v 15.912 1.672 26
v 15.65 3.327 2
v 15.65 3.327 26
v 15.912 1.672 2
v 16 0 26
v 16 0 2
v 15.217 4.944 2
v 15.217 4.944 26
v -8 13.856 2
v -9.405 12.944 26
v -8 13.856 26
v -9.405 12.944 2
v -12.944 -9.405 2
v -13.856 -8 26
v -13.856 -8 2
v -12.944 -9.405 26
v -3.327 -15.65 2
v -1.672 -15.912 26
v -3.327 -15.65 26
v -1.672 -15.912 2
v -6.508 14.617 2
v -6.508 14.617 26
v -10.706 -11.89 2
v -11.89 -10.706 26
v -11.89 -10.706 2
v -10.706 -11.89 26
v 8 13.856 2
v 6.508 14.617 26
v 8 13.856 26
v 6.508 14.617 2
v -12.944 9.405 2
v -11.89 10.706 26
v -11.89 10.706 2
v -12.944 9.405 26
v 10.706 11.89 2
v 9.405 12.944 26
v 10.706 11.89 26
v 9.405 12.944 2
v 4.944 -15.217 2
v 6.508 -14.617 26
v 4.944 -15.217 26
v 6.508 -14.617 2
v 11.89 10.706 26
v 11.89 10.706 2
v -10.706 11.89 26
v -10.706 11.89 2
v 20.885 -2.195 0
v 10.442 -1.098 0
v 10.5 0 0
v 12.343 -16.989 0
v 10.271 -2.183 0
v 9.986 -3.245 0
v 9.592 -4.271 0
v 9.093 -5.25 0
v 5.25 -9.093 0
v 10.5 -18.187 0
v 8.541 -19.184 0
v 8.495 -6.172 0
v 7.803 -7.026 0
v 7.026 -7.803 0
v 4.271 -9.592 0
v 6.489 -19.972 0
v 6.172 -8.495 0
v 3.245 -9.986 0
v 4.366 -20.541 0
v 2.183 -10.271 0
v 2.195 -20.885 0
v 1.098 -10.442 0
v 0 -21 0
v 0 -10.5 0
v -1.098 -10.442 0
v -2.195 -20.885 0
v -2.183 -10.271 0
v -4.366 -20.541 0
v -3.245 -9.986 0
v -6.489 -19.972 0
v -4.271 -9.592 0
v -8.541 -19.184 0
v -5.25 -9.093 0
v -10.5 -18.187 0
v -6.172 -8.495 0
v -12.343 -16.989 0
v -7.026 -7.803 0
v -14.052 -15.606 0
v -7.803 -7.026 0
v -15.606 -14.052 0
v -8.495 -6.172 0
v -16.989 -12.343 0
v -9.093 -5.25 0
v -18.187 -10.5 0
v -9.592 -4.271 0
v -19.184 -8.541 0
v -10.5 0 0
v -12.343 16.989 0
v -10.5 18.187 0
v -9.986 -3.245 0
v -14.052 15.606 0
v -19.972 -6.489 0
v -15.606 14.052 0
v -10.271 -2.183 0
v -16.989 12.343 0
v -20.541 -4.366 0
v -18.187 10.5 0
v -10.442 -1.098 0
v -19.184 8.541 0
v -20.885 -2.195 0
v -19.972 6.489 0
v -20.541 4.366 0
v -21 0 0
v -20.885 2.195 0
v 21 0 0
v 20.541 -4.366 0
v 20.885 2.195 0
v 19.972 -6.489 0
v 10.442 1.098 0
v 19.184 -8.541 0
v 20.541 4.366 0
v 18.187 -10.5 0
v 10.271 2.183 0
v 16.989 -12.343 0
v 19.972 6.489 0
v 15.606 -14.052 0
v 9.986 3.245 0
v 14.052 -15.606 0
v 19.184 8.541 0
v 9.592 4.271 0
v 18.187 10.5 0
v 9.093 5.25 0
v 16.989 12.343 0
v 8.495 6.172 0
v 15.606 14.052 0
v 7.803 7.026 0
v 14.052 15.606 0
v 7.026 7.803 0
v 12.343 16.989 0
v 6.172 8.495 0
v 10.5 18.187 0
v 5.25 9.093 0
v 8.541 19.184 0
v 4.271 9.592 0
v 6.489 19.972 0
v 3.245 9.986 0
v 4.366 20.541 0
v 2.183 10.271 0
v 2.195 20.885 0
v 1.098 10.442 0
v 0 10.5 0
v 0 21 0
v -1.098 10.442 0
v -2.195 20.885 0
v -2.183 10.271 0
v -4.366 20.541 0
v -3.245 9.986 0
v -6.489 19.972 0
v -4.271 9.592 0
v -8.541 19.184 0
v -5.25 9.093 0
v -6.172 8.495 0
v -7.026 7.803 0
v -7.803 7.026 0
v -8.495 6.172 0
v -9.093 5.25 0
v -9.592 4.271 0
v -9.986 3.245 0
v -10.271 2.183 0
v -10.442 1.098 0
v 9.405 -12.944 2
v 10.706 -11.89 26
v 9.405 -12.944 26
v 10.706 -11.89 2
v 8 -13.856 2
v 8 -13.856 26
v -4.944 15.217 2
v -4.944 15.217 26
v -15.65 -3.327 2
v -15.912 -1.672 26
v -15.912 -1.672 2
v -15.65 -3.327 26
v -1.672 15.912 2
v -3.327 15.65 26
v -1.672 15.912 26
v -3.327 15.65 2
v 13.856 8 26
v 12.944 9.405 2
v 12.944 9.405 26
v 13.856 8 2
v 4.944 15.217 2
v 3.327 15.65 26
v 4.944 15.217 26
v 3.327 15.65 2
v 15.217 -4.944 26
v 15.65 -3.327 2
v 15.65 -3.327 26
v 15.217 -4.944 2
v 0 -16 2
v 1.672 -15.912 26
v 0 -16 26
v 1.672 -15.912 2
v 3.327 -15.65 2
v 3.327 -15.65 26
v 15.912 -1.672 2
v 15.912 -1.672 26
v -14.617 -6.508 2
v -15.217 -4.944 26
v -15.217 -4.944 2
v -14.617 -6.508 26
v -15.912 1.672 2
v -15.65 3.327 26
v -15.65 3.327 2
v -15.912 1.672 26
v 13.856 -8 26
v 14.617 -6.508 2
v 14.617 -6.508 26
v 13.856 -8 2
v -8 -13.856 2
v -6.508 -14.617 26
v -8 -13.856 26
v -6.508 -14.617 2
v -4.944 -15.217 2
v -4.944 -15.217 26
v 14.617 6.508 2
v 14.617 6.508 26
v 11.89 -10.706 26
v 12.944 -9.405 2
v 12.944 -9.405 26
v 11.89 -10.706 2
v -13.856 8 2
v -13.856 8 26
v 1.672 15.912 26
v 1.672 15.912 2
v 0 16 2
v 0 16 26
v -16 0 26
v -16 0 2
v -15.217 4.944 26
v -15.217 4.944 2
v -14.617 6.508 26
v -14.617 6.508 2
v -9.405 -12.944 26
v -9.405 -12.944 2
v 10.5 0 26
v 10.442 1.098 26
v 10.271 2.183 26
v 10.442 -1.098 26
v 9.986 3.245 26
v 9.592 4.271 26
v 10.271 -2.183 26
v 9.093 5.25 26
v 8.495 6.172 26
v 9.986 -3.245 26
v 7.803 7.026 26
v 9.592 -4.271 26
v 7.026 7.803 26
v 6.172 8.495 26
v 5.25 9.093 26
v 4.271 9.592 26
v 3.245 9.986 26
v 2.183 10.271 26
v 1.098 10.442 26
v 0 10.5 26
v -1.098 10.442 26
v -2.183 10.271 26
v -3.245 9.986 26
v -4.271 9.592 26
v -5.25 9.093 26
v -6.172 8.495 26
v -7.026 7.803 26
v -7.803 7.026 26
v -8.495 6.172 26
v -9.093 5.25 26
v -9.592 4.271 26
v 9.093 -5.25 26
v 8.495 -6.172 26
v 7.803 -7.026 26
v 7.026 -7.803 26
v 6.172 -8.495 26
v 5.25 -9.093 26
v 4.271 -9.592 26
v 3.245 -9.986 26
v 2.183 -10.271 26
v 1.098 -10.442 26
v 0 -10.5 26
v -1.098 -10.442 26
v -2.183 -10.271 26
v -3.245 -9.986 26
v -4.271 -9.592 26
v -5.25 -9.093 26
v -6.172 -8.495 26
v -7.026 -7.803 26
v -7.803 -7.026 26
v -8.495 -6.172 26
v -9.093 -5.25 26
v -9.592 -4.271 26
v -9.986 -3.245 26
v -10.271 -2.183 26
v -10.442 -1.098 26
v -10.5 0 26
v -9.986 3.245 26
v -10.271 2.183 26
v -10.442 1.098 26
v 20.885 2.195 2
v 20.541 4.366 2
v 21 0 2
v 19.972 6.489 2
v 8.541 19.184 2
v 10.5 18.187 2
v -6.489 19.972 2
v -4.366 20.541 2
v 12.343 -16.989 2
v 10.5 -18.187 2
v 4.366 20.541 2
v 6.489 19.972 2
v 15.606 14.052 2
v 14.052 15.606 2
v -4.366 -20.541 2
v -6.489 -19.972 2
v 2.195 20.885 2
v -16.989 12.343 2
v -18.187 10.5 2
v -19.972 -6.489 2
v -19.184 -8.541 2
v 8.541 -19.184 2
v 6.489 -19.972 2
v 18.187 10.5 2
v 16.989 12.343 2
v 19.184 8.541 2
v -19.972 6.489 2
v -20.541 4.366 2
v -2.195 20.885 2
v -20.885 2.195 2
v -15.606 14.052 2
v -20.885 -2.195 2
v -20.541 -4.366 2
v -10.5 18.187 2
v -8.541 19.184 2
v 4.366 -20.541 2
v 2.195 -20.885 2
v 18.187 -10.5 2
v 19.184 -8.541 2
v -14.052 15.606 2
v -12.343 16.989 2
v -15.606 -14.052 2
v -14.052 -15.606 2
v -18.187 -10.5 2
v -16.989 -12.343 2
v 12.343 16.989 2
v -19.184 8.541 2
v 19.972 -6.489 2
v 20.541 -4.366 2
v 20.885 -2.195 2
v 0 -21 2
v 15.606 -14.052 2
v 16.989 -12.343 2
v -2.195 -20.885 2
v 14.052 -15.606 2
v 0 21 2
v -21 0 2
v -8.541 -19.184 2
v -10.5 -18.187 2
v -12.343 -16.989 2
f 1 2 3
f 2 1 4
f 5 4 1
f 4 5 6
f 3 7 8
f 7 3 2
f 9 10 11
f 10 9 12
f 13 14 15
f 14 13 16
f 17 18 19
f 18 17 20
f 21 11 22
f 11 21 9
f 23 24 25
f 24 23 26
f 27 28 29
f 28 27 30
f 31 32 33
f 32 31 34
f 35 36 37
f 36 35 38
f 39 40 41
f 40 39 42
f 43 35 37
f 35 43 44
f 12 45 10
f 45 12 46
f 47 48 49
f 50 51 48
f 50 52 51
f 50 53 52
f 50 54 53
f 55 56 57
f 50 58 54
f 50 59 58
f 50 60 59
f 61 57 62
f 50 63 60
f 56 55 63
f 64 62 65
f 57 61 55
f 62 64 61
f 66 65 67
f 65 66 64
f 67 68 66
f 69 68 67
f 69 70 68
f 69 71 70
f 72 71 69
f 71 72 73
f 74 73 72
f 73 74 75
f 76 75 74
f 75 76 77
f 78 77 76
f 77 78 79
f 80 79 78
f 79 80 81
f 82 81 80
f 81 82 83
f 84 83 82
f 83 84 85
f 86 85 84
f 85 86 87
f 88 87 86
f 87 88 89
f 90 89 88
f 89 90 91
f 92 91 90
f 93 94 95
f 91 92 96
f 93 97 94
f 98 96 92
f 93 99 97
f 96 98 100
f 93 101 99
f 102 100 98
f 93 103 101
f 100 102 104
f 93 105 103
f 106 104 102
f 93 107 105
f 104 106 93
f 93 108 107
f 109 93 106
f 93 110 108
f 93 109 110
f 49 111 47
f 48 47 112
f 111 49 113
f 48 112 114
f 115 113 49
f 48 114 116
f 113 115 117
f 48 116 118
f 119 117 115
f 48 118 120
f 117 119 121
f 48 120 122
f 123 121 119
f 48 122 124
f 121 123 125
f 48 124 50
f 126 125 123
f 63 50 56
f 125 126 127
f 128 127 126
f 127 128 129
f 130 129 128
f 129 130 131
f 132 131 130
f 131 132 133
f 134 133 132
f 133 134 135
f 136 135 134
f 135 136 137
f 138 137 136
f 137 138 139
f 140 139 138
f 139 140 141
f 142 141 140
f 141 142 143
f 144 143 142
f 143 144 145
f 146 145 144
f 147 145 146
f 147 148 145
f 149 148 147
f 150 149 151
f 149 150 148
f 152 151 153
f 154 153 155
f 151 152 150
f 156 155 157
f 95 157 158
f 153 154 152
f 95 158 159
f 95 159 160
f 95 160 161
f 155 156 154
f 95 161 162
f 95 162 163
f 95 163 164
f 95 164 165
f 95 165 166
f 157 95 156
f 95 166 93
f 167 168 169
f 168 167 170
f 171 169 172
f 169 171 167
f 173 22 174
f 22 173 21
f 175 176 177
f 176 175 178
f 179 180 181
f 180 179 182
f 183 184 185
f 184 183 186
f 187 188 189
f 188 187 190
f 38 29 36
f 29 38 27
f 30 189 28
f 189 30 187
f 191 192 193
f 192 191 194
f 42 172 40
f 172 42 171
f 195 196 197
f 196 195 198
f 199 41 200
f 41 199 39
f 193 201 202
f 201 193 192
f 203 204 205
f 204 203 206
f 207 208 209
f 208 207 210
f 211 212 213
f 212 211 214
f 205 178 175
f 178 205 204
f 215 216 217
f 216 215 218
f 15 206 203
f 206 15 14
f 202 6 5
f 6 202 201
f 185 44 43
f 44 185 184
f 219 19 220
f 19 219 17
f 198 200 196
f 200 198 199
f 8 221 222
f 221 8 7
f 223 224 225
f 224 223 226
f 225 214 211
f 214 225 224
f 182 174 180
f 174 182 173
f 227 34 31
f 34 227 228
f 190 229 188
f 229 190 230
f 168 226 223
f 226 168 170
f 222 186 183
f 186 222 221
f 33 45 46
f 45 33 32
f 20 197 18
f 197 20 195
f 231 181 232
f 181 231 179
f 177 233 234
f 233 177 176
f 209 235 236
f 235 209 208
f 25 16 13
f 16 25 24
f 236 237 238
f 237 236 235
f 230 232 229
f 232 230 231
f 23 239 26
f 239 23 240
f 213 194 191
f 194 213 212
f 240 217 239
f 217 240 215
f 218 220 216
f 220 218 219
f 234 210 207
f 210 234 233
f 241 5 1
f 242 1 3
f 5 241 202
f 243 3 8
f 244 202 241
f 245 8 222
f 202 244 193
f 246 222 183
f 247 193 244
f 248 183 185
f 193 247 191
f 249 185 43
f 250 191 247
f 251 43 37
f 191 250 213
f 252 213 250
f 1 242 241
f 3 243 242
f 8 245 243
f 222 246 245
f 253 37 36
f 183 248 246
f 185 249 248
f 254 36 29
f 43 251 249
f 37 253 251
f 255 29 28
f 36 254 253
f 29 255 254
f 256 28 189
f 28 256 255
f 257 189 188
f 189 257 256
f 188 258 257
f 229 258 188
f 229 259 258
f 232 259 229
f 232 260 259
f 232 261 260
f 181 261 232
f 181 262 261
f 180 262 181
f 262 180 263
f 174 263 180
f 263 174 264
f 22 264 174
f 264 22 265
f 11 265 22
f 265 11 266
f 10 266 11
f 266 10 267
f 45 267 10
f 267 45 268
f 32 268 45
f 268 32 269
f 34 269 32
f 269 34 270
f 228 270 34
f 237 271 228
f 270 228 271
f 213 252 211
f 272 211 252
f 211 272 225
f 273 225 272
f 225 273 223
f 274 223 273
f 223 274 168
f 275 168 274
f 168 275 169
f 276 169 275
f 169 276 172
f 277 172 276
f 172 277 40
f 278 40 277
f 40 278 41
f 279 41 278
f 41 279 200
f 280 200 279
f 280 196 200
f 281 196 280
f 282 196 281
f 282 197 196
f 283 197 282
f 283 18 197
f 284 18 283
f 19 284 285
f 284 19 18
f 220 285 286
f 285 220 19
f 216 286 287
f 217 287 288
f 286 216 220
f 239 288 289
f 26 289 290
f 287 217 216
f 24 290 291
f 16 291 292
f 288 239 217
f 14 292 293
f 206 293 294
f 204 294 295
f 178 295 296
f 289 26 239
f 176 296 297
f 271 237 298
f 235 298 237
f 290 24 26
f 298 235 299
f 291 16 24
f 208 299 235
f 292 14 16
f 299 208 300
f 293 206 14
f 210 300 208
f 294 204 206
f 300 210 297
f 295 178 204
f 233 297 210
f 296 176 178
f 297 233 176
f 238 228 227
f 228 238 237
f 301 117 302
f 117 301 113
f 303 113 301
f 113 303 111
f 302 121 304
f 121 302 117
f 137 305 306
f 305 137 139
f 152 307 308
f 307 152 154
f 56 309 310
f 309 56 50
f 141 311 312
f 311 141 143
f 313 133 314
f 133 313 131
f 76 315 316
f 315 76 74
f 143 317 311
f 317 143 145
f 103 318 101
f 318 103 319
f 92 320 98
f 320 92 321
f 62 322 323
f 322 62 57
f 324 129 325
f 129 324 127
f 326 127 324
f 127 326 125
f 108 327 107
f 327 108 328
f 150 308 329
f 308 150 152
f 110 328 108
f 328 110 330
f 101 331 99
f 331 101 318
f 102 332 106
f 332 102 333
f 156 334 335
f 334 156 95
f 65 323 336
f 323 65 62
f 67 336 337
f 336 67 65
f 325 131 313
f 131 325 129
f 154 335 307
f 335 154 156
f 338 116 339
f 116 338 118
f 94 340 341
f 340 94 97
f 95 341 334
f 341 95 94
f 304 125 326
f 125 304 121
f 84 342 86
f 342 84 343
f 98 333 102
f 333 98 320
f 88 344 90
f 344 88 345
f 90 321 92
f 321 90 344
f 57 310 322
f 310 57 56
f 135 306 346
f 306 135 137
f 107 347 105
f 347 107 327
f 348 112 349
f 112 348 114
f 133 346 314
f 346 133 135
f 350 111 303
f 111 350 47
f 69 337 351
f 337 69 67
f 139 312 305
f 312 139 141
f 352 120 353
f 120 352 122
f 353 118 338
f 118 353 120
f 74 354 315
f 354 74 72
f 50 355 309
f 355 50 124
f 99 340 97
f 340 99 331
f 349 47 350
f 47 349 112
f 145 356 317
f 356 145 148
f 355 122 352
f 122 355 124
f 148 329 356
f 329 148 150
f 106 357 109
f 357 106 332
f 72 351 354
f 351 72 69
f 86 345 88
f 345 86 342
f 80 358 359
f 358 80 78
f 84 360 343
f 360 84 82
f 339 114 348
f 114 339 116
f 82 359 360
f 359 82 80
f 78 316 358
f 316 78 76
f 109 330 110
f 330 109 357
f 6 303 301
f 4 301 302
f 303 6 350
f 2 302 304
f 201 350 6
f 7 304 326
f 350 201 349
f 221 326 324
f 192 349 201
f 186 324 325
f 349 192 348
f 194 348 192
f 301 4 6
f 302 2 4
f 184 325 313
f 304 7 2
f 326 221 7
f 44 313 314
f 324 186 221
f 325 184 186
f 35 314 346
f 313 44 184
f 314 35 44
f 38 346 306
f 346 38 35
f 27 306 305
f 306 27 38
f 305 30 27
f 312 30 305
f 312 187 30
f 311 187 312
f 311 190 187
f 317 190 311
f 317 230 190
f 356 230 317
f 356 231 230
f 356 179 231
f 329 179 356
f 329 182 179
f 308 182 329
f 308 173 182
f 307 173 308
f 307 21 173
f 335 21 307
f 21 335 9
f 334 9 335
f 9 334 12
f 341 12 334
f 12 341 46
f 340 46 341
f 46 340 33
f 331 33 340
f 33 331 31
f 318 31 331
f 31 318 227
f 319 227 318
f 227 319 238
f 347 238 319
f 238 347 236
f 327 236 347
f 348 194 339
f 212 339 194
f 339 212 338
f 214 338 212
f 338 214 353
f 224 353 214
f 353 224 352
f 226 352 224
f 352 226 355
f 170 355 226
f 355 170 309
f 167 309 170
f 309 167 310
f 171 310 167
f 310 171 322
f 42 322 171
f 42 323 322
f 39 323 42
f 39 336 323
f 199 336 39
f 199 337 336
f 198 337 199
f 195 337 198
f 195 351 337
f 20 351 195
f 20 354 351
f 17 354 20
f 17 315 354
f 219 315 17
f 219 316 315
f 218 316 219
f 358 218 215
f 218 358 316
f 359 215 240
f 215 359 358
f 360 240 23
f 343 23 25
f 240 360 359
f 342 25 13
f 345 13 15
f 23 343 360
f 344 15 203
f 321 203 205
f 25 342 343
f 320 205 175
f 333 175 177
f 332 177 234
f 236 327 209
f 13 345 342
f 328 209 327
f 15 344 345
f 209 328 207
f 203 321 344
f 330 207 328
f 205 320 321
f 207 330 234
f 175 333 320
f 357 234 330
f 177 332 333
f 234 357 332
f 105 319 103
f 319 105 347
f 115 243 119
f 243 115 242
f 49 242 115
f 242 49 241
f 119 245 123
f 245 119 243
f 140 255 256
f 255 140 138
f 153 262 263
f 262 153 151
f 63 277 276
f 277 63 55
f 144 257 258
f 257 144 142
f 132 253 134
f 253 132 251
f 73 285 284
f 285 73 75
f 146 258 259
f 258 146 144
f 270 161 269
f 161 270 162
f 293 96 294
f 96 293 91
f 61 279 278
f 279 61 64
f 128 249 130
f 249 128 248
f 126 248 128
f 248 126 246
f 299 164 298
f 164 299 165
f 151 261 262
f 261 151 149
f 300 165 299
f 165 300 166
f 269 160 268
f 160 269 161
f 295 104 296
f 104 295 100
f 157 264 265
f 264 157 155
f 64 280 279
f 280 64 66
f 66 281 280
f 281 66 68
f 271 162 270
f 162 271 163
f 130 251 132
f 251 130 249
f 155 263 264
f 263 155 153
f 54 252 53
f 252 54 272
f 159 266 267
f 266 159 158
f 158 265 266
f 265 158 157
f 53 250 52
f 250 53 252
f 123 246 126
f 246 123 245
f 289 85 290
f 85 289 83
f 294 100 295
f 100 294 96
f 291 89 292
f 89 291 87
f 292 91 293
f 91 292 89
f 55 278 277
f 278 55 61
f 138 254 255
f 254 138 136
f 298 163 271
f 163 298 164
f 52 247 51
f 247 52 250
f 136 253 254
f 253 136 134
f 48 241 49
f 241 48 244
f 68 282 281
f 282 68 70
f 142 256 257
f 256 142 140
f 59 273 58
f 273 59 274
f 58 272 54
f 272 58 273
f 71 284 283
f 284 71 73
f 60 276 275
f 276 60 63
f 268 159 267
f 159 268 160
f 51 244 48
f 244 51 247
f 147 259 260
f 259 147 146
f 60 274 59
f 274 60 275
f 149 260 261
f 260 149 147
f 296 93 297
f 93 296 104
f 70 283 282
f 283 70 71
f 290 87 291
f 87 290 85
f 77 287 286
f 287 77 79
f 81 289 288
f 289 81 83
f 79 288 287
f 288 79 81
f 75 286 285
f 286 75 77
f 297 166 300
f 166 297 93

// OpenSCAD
// Flanged threaded insert.
$fn = 60;
eps = 0.02;
inner_d = 21;
outer_d = 32;
length = 26;
flange_d = 42;
difference() {
    union() { cylinder(d=outer_d,h=length); cylinder(d=flange_d,h=2); }
    translate([0,0,-eps]) cylinder(d=inner_d,h=length+2*eps);
}
